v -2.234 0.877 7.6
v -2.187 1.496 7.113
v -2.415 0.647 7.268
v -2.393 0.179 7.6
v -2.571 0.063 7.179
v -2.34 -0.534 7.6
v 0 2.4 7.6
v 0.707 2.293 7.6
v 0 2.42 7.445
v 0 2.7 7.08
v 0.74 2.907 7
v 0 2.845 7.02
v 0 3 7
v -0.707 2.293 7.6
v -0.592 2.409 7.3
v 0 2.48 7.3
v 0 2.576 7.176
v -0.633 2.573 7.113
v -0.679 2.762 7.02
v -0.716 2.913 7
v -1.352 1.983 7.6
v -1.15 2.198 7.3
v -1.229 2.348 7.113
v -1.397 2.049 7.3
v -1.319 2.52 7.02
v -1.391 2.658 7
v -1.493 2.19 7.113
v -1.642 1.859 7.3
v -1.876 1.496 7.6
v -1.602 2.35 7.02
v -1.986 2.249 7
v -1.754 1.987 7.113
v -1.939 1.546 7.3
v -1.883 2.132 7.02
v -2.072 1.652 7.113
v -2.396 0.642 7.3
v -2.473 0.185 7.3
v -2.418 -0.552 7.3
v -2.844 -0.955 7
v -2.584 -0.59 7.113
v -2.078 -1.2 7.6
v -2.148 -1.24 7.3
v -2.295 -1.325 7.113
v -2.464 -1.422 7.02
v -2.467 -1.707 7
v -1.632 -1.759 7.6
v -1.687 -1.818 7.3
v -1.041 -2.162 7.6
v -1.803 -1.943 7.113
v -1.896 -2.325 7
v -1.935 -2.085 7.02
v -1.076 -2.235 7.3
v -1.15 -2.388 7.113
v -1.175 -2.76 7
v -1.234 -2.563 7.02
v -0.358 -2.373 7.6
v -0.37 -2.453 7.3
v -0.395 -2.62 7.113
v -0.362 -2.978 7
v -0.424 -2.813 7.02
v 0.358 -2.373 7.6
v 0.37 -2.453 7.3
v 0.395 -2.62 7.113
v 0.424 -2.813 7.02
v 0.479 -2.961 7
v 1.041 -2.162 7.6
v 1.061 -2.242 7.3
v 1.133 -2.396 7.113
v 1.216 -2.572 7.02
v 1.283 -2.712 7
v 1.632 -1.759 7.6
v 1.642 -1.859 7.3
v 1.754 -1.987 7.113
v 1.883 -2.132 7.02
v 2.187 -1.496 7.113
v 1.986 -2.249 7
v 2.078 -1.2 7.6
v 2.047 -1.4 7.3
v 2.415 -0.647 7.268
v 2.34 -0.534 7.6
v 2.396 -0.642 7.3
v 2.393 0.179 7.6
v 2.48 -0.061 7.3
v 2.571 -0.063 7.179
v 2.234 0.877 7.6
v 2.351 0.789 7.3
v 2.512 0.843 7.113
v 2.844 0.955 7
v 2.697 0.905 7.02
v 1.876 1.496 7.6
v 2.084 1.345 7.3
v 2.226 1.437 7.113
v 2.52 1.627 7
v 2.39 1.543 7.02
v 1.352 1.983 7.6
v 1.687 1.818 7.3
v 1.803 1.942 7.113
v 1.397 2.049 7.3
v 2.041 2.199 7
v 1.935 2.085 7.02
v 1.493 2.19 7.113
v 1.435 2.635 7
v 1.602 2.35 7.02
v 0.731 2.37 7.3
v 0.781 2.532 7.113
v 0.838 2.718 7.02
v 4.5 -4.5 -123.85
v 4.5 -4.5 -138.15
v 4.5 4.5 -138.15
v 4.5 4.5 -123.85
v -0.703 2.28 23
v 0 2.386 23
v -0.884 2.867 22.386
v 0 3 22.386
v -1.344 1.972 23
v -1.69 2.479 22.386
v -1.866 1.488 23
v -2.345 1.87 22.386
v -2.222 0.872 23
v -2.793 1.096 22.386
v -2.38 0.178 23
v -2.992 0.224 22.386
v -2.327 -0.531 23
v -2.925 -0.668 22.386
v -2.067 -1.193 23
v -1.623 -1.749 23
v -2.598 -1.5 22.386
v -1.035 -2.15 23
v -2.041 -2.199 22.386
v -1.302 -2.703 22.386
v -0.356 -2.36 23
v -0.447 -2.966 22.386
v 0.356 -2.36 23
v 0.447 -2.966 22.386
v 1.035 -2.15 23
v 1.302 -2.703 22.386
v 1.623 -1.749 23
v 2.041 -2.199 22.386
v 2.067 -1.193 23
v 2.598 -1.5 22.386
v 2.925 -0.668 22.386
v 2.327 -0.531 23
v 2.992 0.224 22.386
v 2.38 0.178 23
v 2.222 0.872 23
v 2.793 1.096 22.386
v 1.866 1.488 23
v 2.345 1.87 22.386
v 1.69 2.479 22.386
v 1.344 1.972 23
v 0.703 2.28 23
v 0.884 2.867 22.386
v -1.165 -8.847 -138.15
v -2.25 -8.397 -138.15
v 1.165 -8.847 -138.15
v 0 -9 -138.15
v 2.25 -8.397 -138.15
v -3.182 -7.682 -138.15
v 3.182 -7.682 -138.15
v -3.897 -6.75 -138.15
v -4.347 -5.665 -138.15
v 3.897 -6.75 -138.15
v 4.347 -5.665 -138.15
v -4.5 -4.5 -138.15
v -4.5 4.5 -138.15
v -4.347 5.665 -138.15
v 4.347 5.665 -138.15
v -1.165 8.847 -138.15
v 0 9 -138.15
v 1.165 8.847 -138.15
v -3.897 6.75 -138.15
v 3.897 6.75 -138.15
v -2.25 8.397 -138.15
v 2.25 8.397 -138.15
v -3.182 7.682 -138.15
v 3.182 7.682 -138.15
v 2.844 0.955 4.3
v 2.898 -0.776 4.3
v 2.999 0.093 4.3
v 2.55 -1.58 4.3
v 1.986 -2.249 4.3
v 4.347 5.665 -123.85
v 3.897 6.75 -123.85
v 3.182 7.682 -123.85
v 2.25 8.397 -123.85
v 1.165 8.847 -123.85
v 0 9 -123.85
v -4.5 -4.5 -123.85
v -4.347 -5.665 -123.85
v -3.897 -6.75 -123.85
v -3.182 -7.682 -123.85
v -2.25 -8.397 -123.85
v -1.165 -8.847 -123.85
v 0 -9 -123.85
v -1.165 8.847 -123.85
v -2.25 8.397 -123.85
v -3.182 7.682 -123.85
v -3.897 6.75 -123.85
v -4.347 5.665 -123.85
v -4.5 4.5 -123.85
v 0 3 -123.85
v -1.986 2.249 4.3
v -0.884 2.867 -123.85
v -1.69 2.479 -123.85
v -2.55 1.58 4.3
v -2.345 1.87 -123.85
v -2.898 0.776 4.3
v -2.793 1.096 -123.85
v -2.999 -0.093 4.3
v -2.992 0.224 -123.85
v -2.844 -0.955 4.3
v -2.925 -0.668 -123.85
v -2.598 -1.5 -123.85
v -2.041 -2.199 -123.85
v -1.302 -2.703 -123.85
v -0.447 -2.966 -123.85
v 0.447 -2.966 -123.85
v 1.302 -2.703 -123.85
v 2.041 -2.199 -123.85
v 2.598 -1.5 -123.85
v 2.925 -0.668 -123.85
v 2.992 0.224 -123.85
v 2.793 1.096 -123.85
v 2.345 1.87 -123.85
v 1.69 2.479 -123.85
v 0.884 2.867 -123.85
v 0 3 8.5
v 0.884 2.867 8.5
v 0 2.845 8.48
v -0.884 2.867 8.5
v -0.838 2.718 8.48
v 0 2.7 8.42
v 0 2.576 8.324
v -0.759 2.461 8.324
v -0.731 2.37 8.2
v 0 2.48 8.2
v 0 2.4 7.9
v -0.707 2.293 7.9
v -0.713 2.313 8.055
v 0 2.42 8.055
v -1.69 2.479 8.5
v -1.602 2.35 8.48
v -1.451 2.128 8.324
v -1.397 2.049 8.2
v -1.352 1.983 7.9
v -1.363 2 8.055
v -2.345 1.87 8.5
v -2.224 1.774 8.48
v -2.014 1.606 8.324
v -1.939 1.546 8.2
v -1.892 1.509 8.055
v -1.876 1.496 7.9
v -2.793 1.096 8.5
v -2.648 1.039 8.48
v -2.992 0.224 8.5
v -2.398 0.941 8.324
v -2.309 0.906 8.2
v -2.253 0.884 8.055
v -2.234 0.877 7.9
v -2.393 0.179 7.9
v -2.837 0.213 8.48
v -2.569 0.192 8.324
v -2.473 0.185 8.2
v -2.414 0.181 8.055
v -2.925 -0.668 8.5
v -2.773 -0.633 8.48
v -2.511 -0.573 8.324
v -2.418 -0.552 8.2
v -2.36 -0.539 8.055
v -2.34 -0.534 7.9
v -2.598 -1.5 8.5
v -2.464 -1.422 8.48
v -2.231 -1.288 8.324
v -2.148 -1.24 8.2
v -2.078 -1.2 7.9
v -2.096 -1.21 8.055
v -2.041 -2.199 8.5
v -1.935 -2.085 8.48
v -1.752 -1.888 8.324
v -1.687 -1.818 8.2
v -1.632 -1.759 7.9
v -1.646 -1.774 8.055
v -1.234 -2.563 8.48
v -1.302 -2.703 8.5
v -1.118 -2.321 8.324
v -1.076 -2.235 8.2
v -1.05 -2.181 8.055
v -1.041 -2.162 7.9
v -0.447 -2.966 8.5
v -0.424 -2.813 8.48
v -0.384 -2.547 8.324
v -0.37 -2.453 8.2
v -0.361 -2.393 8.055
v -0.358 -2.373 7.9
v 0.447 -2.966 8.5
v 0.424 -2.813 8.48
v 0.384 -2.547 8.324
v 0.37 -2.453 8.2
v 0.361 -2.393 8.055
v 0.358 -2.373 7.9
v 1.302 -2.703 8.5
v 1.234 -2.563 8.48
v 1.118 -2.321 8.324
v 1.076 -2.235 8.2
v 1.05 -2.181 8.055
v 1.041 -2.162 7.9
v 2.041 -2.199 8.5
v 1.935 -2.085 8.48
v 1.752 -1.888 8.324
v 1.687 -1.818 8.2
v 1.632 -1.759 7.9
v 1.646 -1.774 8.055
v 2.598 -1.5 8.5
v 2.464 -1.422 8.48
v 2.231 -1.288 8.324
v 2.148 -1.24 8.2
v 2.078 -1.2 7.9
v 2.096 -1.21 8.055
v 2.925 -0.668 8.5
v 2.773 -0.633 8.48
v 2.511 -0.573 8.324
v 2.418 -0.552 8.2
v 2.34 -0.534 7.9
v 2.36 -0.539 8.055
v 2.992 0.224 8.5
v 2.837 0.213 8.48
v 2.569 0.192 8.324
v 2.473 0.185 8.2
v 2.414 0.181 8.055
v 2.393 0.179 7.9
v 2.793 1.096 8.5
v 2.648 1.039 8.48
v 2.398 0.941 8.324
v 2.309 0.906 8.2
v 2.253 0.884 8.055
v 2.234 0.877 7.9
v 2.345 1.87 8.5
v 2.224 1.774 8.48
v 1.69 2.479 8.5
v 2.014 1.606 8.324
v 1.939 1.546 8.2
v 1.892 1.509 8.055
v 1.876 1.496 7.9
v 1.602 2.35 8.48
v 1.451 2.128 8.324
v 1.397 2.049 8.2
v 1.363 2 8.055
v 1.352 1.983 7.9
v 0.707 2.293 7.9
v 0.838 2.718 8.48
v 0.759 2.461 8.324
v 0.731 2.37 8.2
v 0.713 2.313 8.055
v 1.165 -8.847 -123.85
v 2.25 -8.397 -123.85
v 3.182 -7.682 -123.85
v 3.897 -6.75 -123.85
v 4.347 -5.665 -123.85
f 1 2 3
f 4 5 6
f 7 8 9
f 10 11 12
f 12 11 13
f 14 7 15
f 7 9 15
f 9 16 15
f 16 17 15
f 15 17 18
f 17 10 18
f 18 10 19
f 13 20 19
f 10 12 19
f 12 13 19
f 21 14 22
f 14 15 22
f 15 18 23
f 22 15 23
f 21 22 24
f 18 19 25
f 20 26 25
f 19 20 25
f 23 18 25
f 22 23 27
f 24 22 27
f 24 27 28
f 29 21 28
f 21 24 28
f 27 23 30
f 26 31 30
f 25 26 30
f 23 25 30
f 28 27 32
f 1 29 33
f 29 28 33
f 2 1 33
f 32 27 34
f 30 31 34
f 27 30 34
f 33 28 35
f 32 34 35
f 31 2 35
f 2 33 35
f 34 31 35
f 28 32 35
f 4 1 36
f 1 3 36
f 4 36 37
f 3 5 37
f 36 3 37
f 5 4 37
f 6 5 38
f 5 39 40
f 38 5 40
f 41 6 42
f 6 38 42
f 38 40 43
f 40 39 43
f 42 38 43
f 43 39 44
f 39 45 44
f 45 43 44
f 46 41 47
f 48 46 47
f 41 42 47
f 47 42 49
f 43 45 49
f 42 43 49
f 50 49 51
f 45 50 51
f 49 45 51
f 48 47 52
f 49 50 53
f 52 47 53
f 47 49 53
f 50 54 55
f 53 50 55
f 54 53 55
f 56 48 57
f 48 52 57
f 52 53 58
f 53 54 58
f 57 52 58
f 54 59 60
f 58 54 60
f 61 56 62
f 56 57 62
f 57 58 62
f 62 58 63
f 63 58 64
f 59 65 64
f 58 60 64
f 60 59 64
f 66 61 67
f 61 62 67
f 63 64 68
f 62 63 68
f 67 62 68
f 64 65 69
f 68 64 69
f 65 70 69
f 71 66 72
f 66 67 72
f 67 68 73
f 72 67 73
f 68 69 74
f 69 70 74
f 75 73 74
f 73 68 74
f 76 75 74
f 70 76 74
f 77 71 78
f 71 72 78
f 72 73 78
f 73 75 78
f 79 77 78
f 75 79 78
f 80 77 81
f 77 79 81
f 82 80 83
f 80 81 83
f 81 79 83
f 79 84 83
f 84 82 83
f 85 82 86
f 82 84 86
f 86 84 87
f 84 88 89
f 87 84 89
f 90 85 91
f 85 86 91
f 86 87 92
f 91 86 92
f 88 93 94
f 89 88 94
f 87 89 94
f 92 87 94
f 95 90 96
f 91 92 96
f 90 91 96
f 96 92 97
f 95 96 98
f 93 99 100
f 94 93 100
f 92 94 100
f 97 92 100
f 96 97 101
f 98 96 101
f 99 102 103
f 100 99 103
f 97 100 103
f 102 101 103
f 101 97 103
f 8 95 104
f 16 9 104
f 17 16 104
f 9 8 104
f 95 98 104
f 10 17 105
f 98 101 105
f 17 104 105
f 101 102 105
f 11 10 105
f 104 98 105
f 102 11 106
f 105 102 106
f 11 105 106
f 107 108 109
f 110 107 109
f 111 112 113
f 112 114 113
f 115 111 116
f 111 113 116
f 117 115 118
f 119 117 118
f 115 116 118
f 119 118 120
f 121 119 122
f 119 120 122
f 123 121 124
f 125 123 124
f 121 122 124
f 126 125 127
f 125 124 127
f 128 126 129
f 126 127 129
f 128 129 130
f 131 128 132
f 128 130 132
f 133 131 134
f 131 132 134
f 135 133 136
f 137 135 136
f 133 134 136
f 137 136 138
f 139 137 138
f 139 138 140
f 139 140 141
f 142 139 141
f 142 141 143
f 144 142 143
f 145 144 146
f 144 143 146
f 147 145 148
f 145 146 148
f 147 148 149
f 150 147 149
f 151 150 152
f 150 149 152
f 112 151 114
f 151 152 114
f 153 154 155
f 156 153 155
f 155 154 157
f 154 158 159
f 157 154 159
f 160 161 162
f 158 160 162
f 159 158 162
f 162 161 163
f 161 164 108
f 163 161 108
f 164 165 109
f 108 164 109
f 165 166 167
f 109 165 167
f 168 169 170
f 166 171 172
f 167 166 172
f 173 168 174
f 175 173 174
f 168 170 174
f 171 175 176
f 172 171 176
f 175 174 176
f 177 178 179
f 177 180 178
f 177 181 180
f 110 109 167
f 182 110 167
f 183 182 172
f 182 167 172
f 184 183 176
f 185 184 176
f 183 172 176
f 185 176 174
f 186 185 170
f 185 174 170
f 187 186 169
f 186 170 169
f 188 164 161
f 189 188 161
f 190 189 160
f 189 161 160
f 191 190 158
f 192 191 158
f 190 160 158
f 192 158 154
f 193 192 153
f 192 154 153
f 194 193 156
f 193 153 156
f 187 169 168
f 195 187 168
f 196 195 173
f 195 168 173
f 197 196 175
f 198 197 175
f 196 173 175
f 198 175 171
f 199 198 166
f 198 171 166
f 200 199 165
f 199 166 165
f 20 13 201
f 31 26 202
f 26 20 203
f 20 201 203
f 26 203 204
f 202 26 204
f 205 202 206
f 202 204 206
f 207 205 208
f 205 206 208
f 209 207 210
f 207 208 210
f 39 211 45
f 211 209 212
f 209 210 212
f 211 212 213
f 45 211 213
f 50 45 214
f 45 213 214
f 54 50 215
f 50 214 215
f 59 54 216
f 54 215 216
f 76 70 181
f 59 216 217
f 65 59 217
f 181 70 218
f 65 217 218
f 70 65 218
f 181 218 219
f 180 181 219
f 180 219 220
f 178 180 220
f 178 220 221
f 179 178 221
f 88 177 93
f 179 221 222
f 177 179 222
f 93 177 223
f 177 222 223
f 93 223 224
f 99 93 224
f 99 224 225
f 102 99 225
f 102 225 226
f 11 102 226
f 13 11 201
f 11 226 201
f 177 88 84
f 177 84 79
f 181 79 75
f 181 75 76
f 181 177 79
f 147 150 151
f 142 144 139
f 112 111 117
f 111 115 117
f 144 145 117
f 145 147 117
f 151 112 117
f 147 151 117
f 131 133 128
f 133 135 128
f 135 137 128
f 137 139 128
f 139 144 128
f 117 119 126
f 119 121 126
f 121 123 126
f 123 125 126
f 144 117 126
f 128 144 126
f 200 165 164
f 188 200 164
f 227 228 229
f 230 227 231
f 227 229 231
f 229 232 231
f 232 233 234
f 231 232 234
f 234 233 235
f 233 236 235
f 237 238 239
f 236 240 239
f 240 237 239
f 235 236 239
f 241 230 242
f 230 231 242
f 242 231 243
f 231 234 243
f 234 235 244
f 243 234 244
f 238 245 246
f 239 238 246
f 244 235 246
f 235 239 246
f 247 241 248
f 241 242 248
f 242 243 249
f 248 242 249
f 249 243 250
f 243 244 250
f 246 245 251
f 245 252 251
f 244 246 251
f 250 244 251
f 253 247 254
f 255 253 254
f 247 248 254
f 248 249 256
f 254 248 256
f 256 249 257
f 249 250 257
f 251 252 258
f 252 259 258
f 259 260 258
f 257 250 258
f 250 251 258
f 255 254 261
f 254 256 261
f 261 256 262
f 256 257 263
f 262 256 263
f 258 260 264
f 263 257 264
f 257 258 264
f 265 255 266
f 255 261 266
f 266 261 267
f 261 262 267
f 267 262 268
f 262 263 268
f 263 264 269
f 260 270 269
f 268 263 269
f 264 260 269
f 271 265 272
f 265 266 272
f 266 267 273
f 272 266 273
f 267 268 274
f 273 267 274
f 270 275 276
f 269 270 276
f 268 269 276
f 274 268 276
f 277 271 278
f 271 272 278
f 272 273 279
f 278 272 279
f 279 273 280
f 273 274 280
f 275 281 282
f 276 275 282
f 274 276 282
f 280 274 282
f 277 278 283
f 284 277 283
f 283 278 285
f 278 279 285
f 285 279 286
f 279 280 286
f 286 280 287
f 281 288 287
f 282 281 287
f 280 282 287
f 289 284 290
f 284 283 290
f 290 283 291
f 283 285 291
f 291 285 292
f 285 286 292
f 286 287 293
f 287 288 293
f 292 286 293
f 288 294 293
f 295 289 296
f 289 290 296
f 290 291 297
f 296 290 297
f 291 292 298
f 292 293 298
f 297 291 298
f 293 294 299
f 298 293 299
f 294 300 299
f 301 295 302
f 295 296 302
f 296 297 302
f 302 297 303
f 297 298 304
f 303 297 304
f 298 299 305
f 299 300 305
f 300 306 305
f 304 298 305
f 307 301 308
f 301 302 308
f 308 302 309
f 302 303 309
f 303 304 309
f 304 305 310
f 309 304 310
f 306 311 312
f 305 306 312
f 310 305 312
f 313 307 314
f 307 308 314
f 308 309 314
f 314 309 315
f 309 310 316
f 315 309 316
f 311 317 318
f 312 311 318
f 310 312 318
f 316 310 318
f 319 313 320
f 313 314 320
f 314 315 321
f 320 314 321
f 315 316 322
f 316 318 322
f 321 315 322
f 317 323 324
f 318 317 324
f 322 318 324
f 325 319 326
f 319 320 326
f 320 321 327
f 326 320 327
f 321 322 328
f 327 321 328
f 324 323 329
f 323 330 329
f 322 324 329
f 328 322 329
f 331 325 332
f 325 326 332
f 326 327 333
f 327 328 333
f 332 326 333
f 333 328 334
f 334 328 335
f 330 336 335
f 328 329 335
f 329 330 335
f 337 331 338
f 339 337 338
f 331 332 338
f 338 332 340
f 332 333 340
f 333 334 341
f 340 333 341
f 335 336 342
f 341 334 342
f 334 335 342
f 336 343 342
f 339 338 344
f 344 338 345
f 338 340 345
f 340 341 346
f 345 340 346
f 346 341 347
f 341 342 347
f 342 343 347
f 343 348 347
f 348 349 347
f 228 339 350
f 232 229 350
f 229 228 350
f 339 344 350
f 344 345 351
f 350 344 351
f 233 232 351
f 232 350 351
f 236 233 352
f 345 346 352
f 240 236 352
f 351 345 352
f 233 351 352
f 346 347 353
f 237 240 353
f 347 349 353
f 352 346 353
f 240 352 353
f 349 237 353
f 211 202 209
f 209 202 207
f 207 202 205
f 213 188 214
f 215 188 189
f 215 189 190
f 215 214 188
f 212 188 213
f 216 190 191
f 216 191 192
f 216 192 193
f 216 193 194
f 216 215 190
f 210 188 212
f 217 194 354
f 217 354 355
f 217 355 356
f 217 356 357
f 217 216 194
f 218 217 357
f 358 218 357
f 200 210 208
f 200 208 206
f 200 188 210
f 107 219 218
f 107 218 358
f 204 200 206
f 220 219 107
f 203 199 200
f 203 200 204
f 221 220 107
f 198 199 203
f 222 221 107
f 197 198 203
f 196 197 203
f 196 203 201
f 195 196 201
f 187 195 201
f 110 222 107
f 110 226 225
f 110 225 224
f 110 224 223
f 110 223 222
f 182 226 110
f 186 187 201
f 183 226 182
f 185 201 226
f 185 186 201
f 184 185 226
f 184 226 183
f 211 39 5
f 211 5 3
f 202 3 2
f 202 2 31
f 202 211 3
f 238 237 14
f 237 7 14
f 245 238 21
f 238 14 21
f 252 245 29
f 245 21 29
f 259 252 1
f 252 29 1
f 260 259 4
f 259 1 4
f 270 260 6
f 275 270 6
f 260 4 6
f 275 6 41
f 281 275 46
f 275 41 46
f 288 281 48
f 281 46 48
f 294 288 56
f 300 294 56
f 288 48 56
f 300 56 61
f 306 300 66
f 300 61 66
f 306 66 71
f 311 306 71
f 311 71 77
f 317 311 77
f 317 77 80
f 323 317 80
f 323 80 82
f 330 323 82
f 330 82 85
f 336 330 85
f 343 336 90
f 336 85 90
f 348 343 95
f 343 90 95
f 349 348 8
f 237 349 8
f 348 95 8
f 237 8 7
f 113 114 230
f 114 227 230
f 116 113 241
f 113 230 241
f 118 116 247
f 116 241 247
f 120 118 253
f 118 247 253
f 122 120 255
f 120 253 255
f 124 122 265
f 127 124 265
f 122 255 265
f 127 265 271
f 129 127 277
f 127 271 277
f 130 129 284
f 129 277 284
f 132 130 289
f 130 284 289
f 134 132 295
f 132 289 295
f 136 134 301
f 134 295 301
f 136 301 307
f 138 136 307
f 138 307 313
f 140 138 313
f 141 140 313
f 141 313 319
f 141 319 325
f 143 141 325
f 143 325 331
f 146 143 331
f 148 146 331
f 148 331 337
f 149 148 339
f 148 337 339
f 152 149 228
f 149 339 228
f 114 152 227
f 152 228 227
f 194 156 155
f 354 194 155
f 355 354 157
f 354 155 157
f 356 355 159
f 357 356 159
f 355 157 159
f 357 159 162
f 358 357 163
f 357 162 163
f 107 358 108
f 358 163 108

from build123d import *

# Parameters (mm, degrees)
SKETCH2_W           = 145.15
SKETCH2_H           = 3
CUT_EXTRUDE1_DEPTH  = 3.3
BOSS_EXTRUDE1_DEPTH = 14.3


with BuildPart() as part:
    # Sketch1 → Revolve1 (revolve)
    with BuildSketch(Plane(origin=(0, 0, 0), x_dir=(0, 0, -1), z_dir=(1, 0, 0))):
        with BuildLine():
            Line((-23, 0), (-23, 2.3865))
            Line((-23, 2.3865), (-22.3865, 3))
            Line((-22.3865, 3), (-8.5, 3))
            ThreePointArc((-8.5, 3), (-8.324264069, 2.575735931), (-7.9, 2.4))
            Line((-7.9, 2.4), (-7.6, 2.4))
            ThreePointArc((-7.6, 2.4), (-7.175735931, 2.575735931), (-7, 3))
            Line((-7, 3), (-6.5, 3))
            Line((-6.5, 3), (-6.5, 0))
            Line((-6.5, 0), (-23, 0))
        make_face()
    revolve(axis=Axis((0, 0, 6.5), (0, 0, 1)))

    # Sketch2 → Revolve2 (revolve)
    with BuildSketch(Plane(origin=(0, 0, 0), x_dir=(0, 0, -1), z_dir=(1, 0, 0))):
        with Locations((65.575, 1.5)):
            Rectangle(SKETCH2_W, SKETCH2_H)
    revolve(axis=Axis((0, 0, -138.15), (0, 0, 1)))

    # Sketch3 → Cut-Extrude1 (cut)
    with BuildSketch(Plane.XY.offset(4.3)):
        Polygon((-6.447248163, -4.742941189), (3.2120101, -7.33113164), (5.800200551, 2.328126623), (3.385385985, 2.975174236), (1.12071934, -5.476676744), (-3.708909791, -4.182581519), (-1.444243147, 4.269269461), (-3.859057712, 4.916317074), align=None)
    extrude(amount=CUT_EXTRUDE1_DEPTH, mode=Mode.SUBTRACT)

    # Sketch4 → Boss-Extrude1 (add)
    with BuildSketch(Plane.XY.offset(-138.15)):
        with BuildLine():
            Line((4.5, -4.5), (4.5, 4.5))
            ThreePointArc((4.5, 4.5), (3.181980515, 7.681980515), (0, 9))
            ThreePointArc((0, 9), (-3.181980515, 7.681980515), (-4.5, 4.5))
            Line((-4.5, 4.5), (-4.5, -4.5))
            ThreePointArc((-4.5, -4.5), (-3.181980515, -7.681980515), (0, -9))
            ThreePointArc((0, -9), (3.181980515, -7.681980515), (4.5, -4.5))
        make_face()
    extrude(amount=BOSS_EXTRUDE1_DEPTH)


solid = part.part
